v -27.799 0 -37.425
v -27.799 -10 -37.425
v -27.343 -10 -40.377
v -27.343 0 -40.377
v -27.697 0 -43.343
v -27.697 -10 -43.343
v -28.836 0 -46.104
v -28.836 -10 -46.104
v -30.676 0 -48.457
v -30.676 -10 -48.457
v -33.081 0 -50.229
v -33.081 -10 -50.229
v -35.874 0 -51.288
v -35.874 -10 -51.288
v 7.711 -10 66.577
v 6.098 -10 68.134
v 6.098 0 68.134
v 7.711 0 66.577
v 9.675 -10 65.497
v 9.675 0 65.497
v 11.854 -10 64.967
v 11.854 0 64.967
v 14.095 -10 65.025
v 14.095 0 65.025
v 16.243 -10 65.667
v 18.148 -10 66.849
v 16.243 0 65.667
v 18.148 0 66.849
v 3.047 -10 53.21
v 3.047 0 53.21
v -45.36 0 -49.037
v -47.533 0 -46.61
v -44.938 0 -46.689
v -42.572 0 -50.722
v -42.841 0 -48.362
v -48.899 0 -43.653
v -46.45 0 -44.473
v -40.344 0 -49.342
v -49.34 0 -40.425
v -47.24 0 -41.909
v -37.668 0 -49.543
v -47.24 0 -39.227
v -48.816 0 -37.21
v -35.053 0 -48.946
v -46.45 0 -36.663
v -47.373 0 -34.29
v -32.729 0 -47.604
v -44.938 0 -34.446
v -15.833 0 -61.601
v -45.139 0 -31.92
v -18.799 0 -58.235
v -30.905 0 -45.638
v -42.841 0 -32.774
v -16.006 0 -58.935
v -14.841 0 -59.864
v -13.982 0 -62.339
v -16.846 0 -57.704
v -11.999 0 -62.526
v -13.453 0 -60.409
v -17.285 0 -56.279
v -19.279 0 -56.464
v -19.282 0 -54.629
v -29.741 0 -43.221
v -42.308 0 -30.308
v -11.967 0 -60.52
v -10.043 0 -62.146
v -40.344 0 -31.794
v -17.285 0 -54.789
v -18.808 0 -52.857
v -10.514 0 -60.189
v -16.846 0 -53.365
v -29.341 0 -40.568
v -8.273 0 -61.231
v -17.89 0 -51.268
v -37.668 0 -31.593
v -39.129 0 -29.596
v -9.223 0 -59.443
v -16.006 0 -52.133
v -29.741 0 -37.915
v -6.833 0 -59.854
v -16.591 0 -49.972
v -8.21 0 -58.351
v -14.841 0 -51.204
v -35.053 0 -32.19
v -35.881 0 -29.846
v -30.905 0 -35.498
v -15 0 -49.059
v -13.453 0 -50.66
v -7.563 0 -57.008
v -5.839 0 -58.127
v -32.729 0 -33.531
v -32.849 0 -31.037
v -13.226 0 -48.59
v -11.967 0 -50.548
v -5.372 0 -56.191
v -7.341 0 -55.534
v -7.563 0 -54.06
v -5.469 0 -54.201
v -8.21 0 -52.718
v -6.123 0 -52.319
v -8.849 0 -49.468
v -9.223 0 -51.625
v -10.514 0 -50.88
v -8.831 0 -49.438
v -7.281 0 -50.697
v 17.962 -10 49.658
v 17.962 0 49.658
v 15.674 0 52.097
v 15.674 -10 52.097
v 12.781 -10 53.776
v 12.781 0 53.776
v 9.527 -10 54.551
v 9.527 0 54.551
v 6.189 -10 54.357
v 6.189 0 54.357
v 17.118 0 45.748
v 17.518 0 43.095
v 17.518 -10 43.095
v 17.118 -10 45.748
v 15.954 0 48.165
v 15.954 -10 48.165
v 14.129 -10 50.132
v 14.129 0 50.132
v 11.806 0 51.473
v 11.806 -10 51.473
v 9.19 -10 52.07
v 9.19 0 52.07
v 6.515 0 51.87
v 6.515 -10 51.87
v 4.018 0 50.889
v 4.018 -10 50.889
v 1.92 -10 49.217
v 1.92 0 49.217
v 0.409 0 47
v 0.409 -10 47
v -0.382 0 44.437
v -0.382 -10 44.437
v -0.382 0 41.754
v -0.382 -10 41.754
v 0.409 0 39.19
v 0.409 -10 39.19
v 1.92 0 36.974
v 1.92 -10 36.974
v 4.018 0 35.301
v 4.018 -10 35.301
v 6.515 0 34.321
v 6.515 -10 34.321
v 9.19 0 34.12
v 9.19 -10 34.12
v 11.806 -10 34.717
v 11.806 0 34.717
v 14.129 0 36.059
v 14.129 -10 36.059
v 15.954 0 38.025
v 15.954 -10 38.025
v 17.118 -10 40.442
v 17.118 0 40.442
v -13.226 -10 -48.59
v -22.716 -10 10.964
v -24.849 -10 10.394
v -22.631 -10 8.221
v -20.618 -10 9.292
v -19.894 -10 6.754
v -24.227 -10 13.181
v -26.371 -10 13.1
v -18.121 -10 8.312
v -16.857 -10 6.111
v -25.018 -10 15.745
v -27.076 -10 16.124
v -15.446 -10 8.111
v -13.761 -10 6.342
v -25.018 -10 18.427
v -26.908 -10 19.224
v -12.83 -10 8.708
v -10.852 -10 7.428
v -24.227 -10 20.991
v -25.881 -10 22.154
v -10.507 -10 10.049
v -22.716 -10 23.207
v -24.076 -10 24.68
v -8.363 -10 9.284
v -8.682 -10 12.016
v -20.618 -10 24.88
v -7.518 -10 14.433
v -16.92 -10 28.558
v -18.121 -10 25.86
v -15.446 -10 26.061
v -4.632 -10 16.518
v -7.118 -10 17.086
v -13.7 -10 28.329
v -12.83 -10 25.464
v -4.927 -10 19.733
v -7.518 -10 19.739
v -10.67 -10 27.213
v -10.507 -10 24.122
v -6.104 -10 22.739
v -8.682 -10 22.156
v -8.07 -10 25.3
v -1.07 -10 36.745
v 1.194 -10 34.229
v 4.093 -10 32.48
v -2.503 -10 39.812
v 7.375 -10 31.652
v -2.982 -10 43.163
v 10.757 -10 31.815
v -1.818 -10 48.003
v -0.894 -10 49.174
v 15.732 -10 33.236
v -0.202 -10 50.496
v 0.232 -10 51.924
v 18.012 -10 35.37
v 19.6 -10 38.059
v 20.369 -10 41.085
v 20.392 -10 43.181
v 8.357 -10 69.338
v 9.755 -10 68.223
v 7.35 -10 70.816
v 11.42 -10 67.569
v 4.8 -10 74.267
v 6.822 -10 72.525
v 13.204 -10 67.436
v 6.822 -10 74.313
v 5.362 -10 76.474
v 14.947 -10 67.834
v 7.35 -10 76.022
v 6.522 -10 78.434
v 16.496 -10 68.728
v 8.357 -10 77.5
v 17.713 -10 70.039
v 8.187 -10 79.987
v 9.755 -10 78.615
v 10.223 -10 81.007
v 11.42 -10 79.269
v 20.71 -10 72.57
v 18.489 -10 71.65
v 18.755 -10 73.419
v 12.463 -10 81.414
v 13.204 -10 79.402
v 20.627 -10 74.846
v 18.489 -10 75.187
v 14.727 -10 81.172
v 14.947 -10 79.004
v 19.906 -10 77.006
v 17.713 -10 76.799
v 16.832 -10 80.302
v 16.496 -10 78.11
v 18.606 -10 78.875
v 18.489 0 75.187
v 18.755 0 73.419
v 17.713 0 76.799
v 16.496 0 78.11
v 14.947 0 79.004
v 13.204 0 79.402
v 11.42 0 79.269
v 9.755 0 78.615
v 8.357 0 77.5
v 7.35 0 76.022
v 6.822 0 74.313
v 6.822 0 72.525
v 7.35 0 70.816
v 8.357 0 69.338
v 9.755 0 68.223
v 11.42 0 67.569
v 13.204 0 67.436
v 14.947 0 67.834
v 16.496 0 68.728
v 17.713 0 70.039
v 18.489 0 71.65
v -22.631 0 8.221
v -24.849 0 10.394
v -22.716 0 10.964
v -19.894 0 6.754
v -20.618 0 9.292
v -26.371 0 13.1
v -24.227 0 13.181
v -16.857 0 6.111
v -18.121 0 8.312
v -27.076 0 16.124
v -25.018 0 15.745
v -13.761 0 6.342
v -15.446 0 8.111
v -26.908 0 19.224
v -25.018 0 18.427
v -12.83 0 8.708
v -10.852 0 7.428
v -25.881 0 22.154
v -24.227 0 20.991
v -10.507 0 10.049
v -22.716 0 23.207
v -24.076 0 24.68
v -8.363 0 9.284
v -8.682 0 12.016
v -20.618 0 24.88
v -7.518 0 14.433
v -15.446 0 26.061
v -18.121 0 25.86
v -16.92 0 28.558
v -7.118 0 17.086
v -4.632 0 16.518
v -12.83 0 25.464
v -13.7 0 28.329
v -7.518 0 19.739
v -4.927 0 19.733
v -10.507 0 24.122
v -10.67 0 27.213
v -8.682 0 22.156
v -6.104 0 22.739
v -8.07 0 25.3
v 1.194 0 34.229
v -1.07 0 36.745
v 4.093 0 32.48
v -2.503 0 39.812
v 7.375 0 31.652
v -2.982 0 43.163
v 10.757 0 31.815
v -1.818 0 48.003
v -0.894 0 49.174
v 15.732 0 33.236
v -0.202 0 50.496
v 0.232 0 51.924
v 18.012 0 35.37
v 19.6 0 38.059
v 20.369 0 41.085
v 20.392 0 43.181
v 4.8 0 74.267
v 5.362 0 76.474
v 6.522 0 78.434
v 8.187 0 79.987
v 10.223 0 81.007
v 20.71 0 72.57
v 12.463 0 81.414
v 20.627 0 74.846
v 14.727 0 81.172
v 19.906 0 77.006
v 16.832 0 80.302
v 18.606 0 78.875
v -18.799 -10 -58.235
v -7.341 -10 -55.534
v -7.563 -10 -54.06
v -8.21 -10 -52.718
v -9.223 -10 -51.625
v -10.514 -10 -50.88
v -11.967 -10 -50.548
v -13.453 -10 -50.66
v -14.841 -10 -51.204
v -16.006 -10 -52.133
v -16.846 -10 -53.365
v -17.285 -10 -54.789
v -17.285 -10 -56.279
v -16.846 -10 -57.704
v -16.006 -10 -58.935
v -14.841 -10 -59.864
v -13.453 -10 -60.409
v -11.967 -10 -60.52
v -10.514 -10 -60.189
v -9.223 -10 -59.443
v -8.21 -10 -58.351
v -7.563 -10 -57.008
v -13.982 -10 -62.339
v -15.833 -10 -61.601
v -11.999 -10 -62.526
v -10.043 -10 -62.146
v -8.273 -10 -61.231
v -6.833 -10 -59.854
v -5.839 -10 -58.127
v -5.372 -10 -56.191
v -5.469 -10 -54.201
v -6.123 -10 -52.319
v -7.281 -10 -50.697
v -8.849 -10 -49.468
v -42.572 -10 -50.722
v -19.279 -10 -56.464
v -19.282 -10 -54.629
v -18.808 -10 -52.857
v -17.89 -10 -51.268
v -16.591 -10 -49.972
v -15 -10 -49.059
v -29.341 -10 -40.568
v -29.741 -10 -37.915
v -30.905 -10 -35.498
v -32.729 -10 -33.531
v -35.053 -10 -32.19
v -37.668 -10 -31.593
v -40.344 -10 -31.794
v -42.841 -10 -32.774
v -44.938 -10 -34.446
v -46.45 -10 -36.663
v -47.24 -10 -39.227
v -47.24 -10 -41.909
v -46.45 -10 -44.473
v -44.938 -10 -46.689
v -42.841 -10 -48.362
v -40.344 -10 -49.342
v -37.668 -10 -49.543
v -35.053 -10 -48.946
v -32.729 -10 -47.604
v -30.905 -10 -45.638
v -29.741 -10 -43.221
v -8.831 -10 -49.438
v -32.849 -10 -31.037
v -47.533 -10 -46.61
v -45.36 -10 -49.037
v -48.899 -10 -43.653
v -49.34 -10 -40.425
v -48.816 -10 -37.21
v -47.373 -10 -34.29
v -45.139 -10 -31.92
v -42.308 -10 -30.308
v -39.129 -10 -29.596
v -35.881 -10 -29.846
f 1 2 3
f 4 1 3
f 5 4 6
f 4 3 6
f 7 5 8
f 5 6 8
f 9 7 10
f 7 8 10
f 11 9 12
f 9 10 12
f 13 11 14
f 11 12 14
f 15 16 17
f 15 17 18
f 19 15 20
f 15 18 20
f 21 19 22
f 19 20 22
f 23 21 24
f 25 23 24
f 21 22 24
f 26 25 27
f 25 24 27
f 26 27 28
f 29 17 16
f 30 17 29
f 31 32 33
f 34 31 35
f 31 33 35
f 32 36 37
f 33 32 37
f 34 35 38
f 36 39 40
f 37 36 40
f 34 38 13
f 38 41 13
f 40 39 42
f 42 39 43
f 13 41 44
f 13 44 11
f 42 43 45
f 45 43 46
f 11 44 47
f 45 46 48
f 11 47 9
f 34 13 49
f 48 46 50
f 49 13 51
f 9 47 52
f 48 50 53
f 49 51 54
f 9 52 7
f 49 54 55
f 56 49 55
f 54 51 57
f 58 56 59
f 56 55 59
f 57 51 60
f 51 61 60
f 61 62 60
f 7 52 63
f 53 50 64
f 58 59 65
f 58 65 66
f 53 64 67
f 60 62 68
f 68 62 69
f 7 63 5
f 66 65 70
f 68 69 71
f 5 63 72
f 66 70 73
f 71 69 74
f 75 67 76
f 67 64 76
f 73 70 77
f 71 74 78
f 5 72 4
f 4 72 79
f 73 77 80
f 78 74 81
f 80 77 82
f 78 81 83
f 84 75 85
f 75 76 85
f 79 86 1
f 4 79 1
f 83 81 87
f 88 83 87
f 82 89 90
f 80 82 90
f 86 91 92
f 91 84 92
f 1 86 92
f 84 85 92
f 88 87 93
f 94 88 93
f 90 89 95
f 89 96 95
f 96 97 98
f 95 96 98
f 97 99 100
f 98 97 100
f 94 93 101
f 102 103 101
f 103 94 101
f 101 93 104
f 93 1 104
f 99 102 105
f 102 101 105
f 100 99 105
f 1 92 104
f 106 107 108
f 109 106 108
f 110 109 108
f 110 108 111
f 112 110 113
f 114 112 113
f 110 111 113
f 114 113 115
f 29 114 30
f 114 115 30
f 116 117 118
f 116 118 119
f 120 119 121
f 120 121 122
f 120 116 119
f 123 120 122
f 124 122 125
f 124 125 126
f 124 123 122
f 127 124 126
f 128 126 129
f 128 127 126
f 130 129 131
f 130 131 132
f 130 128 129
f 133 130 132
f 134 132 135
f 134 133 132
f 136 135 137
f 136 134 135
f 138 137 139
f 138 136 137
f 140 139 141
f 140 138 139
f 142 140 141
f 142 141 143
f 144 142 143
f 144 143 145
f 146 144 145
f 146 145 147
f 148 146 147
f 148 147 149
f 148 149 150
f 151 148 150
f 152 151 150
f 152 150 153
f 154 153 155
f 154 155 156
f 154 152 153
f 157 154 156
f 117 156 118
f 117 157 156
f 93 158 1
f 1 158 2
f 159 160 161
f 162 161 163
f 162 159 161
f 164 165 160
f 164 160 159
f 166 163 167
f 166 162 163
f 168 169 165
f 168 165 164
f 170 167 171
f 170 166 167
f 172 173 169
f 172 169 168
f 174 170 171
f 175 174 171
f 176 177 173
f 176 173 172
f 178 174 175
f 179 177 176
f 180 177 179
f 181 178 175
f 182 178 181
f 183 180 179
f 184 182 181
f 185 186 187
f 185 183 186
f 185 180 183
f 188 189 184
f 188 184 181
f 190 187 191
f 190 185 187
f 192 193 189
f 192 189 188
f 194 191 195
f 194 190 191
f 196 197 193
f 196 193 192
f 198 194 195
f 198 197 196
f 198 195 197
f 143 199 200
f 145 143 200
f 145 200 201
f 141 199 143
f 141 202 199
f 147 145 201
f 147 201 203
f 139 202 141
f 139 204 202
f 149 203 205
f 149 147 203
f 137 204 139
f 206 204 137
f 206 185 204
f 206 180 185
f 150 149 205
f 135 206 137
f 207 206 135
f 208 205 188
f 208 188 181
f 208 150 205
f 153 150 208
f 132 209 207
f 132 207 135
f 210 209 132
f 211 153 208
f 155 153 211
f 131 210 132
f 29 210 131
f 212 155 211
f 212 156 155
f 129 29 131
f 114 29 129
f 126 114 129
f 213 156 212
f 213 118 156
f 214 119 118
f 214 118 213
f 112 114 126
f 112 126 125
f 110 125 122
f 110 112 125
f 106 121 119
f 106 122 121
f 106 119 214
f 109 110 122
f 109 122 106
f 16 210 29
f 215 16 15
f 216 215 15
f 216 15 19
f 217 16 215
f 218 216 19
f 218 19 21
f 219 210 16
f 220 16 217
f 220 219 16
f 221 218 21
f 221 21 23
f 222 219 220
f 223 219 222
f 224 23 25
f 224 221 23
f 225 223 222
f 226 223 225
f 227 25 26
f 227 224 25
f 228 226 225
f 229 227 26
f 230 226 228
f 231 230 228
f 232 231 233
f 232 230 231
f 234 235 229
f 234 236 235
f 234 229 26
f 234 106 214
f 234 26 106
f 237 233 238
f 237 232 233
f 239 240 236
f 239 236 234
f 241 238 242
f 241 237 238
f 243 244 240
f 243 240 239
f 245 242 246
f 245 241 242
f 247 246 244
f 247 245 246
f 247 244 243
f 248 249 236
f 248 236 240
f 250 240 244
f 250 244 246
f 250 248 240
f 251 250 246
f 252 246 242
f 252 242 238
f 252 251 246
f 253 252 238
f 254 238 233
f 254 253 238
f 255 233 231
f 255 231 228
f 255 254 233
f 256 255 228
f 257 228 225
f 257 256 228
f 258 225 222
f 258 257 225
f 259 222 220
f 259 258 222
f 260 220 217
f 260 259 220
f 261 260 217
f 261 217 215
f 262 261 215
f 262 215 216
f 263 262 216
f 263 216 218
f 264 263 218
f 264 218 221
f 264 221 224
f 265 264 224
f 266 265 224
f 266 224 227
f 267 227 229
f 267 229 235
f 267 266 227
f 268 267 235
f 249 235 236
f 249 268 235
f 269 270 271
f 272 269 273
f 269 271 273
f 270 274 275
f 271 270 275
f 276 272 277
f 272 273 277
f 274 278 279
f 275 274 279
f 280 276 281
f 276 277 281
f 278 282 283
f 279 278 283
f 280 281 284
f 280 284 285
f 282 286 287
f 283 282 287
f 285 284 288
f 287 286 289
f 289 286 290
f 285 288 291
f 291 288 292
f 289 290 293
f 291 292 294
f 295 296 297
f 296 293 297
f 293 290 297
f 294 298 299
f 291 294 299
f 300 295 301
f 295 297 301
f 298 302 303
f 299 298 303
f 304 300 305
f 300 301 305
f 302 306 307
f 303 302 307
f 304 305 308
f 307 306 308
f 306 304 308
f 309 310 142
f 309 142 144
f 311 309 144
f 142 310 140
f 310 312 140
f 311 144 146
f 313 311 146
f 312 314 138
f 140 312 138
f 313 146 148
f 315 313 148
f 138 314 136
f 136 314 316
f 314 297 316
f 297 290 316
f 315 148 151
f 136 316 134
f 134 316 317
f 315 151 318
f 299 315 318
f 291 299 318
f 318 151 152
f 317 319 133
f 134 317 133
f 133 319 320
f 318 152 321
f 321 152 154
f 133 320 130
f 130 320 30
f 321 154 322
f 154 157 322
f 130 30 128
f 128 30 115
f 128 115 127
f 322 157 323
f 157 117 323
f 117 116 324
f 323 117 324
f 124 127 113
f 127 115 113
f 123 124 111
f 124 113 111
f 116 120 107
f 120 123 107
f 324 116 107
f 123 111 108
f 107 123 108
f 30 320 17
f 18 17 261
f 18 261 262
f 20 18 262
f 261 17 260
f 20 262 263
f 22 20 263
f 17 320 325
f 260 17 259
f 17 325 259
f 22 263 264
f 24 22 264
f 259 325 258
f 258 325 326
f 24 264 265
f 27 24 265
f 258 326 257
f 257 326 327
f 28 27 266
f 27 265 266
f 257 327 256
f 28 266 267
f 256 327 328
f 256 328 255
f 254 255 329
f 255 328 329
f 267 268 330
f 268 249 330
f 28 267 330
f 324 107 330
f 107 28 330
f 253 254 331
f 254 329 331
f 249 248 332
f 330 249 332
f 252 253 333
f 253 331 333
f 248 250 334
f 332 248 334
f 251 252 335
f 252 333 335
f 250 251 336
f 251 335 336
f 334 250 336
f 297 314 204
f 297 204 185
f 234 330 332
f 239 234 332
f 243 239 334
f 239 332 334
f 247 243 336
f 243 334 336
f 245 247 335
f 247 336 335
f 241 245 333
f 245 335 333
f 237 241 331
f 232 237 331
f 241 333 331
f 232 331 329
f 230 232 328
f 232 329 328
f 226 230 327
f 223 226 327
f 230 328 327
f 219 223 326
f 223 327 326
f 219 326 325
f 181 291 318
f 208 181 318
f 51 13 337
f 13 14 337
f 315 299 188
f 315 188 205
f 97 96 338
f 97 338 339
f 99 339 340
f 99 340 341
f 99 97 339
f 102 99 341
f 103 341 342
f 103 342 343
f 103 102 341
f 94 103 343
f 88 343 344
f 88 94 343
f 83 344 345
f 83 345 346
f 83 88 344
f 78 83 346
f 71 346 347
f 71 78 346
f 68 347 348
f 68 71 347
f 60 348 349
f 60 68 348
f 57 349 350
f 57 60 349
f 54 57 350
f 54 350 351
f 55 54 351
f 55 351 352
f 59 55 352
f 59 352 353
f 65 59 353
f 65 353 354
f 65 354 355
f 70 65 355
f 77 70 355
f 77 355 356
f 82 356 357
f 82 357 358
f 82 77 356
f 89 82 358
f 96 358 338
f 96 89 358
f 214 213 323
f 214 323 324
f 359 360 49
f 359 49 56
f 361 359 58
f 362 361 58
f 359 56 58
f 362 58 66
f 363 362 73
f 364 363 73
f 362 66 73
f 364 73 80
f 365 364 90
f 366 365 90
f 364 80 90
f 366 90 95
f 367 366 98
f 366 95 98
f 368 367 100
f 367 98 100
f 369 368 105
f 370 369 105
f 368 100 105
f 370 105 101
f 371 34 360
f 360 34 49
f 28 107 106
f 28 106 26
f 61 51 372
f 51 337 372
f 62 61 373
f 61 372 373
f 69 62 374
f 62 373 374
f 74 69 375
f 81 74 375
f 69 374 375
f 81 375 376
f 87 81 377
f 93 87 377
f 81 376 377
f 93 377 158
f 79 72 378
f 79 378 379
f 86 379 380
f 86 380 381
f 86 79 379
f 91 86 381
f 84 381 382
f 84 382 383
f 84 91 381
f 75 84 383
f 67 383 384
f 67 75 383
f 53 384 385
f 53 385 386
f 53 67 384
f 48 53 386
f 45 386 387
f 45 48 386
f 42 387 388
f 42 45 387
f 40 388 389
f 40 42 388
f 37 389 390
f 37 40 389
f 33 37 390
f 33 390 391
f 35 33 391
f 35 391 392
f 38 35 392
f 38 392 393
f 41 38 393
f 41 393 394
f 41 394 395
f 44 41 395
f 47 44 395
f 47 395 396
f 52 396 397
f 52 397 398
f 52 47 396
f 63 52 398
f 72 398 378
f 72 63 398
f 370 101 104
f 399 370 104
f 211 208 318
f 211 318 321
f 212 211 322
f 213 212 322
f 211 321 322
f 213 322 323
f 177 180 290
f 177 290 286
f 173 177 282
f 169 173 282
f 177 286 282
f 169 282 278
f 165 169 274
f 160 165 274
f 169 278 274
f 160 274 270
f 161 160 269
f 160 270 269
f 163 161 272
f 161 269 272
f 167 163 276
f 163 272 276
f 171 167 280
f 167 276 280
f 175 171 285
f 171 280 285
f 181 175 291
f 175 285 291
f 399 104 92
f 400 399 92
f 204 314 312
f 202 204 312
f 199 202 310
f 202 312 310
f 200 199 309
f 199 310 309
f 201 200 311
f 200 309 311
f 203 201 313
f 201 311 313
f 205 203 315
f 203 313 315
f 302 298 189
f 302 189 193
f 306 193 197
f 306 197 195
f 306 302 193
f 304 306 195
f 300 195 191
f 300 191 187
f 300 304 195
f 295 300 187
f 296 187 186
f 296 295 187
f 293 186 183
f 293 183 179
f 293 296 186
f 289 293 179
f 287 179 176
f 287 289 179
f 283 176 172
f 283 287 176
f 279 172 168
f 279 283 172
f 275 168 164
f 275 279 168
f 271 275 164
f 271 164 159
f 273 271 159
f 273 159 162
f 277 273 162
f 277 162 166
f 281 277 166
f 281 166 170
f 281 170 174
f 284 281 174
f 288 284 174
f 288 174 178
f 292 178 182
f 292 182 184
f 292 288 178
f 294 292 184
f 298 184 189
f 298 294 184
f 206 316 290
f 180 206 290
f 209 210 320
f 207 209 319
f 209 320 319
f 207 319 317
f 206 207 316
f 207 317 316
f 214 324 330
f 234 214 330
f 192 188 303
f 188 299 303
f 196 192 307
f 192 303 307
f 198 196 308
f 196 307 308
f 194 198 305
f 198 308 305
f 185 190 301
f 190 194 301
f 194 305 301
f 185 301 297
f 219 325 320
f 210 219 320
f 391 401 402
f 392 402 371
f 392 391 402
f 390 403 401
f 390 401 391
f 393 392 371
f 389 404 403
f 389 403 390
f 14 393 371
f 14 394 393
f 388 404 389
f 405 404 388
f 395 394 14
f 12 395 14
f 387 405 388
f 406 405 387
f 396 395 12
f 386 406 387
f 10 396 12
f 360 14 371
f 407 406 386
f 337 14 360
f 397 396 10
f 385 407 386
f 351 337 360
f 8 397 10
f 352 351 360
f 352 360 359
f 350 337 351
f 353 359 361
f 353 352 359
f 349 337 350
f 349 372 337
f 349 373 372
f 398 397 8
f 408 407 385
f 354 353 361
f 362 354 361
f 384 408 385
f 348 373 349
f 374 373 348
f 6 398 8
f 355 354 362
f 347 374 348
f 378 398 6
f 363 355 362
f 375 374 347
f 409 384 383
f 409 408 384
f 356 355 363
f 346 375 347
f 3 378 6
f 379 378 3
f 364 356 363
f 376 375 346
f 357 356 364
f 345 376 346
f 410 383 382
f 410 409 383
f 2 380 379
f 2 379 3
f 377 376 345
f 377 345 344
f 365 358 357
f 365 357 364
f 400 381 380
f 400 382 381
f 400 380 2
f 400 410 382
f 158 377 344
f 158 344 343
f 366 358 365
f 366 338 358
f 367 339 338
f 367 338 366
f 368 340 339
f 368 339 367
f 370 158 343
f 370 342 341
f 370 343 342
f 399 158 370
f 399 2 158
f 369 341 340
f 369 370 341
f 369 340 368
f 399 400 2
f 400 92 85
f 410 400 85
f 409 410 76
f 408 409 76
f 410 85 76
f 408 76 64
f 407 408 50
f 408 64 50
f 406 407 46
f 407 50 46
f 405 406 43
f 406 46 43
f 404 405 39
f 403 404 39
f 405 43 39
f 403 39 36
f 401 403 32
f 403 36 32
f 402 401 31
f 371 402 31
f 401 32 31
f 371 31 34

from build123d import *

# Parameters (mm, degrees)
F0_R        = 5
F0_R_2      = 9
F1_DEPTH    = 10
F2_T        = -2
F0_R_3      = 6
F3_DEPTH    = 10
F4_T        = 2.5
F4_T3_DEPTH = 15


# Not quite as in the source:
# - a shell that OpenCascade refuses in one call is made with other operations: the cavity is built on its own and cut out


with BuildPart() as f1:
    # F0 (on Front) → F1 (new body)
    with BuildSketch(Plane.XZ):
        with BuildLine():
            Line((-8.8314399067, -49.4378021172), (-32.8488921378, -31.037019376))
            ThreePointArc((-32.8488921378, -31.037019376), (-48.2033224661, -35.6963509232), (-42.5721099109, -50.7215745931))
            Line((-42.5721099109, -50.7215745931), (-15.8328549722, -61.6009637621))
            ThreePointArc((-15.8328549722, -61.6009637621), (-6.2740037455, -59.026402979), (-8.8485645285, -49.4675517523))
            Line((-8.8485645285, -49.4675517523), (-8.8314399067, -49.4378021172))
        make_face()
        with Locations((-12.3407097504, -55.5342577572)):
            Circle(F0_R, mode=Mode.SUBTRACT)
        with Locations((-38.3408783427, -40.5679210922)):
            Circle(F0_R_2, mode=Mode.SUBTRACT)
    extrude(amount=F1_DEPTH)

    # F2: a shell. OpenCascade refuses it in one call, so the cavity is built on its own and cut out:
    # the body offset inwards by the wall thickness, plus a prism from it out through each open face.
    f2_core = offset(f1.part, amount=F2_T, mode=Mode.PRIVATE)
    f2_exits = [f2_core.faces().sort_by_distance(p)[0] for p in [
        (-23.974872, -8, -48.858148),
        (-23.974872, -2, -48.858148),
    ]]
    add(f2_core, mode=Mode.SUBTRACT)
    extrude(f2_exits, amount=-F2_T, mode=Mode.SUBTRACT)


with BuildPart() as f3:
    # F0 (on Front) → F3 (new body)
    with BuildSketch(Plane.XZ):
        with BuildLine():
            Line((-1.8184846325, 48.0031181659), (-24.0760708981, 24.6802065861))
            ThreePointArc((-24.0760708981, 24.6802065861), (-23.8168254633, 9.2289086893), (-8.3634526675, 9.2844435787))
            Line((-8.3634526675, 9.2844435787), (15.7316601136, 33.2355234732))
            ThreePointArc((15.7316601136, 33.2355234732), (18.901820518, 36.6574412714), (20.3688188047, 41.0854605164))
            Line((20.3688188047, 41.0854605164), (20.3915449047, 43.1814512794))
            Line((20.3915449047, 43.1814512794), (20.7101995844, 72.5704474305))
            ThreePointArc((20.7101995844, 72.5704474305), (13.6038459907, 81.3738410149), (4.8004524063, 74.2674874211))
            Line((4.8004524063, 74.2674874211), (0.2318668126, 51.9236662992))
            ThreePointArc((0.2318668126, 51.9236662992), (-0.5168921946, 49.8188330045), (-1.8184846325, 48.0031181659))
        make_face()
        with Locations((-16.1182750016, 17.0859005302)):
            Circle(F0_R_2, mode=Mode.SUBTRACT)
        with Locations((8.5178585723, 43.0951789021)):
            Circle(F0_R_2, mode=Mode.SUBTRACT)
        with Locations((12.7553259954, 73.4189674258)):
            Circle(F0_R_3, mode=Mode.SUBTRACT)
    extrude(amount=F3_DEPTH)

    # F4: shell of thickness 2.5, made by hand


with BuildPart() as f4_core1:
    # F4_t2: copy of F3
    add(f3.part)

    # the walls: a layer under each face that stays
    f4_faces = [f4_core1.faces().sort_by_distance(p)[0] for p in [
        (18.901820518, -5, 36.6574412714),
        (6.7553259954, -5, 73.4189674258),
        (-0.4821414277, -5, 43.0951789021),
        (-25.1182750016, -5, 17.0859005302),
        (-23.8168254633, -5, 9.2289086893),
        (-12.9472777653, -5, 36.341662376),
        (-0.5168921946, -5, 49.8188330045),
        (2.5161596095, -5, 63.0955768602),
        (13.6038459907, -5, 81.3738410149),
        (20.5395091946, -5, 56.8279539735),
        (3.684103723, -5, 21.259983526),
    ]]
    thicken(f4_faces, amount=-F4_T, mode=Mode.SUBTRACT)

    # F4_s4 → F4_t3 (cut)
    with BuildSketch(Plane.XZ.offset(-2.5)):
        Polygon((15.7636046927, 33.1973004983), (14.2996618195, 35.2847625725), (14.1224923885, 35.1609574377), (13.9692004922, 35.0085818713), align=None)
        Polygon((4.7511001784, 74.2751471197), (7.2497772094, 73.7666800637), (7.27368954, 73.8836293527), (7.2863504029, 74.0023249226), align=None)
        Polygon((20.760057095, 72.5675247552), (18.2243015879, 72.8356099291), (18.2116407249, 72.7169143592), (18.2103465254, 72.5975524692), align=None)
    extrude(amount=F4_T3_DEPTH, mode=Mode.SUBTRACT)


with BuildPart() as f3_1:
    add(f3.part)

    # what is left inside the walls is the cavity
    f4_cavity = [f4_core1.part.solids().sort_by_distance(p)[0] for p in [
        (-3.08156, -0.025, 25.399802),
        (18.029816, -6.666667, 58.253404),
    ]]
    add(f4_cavity, mode=Mode.SUBTRACT)


solid = Compound([f1.part, f3_1.part])
